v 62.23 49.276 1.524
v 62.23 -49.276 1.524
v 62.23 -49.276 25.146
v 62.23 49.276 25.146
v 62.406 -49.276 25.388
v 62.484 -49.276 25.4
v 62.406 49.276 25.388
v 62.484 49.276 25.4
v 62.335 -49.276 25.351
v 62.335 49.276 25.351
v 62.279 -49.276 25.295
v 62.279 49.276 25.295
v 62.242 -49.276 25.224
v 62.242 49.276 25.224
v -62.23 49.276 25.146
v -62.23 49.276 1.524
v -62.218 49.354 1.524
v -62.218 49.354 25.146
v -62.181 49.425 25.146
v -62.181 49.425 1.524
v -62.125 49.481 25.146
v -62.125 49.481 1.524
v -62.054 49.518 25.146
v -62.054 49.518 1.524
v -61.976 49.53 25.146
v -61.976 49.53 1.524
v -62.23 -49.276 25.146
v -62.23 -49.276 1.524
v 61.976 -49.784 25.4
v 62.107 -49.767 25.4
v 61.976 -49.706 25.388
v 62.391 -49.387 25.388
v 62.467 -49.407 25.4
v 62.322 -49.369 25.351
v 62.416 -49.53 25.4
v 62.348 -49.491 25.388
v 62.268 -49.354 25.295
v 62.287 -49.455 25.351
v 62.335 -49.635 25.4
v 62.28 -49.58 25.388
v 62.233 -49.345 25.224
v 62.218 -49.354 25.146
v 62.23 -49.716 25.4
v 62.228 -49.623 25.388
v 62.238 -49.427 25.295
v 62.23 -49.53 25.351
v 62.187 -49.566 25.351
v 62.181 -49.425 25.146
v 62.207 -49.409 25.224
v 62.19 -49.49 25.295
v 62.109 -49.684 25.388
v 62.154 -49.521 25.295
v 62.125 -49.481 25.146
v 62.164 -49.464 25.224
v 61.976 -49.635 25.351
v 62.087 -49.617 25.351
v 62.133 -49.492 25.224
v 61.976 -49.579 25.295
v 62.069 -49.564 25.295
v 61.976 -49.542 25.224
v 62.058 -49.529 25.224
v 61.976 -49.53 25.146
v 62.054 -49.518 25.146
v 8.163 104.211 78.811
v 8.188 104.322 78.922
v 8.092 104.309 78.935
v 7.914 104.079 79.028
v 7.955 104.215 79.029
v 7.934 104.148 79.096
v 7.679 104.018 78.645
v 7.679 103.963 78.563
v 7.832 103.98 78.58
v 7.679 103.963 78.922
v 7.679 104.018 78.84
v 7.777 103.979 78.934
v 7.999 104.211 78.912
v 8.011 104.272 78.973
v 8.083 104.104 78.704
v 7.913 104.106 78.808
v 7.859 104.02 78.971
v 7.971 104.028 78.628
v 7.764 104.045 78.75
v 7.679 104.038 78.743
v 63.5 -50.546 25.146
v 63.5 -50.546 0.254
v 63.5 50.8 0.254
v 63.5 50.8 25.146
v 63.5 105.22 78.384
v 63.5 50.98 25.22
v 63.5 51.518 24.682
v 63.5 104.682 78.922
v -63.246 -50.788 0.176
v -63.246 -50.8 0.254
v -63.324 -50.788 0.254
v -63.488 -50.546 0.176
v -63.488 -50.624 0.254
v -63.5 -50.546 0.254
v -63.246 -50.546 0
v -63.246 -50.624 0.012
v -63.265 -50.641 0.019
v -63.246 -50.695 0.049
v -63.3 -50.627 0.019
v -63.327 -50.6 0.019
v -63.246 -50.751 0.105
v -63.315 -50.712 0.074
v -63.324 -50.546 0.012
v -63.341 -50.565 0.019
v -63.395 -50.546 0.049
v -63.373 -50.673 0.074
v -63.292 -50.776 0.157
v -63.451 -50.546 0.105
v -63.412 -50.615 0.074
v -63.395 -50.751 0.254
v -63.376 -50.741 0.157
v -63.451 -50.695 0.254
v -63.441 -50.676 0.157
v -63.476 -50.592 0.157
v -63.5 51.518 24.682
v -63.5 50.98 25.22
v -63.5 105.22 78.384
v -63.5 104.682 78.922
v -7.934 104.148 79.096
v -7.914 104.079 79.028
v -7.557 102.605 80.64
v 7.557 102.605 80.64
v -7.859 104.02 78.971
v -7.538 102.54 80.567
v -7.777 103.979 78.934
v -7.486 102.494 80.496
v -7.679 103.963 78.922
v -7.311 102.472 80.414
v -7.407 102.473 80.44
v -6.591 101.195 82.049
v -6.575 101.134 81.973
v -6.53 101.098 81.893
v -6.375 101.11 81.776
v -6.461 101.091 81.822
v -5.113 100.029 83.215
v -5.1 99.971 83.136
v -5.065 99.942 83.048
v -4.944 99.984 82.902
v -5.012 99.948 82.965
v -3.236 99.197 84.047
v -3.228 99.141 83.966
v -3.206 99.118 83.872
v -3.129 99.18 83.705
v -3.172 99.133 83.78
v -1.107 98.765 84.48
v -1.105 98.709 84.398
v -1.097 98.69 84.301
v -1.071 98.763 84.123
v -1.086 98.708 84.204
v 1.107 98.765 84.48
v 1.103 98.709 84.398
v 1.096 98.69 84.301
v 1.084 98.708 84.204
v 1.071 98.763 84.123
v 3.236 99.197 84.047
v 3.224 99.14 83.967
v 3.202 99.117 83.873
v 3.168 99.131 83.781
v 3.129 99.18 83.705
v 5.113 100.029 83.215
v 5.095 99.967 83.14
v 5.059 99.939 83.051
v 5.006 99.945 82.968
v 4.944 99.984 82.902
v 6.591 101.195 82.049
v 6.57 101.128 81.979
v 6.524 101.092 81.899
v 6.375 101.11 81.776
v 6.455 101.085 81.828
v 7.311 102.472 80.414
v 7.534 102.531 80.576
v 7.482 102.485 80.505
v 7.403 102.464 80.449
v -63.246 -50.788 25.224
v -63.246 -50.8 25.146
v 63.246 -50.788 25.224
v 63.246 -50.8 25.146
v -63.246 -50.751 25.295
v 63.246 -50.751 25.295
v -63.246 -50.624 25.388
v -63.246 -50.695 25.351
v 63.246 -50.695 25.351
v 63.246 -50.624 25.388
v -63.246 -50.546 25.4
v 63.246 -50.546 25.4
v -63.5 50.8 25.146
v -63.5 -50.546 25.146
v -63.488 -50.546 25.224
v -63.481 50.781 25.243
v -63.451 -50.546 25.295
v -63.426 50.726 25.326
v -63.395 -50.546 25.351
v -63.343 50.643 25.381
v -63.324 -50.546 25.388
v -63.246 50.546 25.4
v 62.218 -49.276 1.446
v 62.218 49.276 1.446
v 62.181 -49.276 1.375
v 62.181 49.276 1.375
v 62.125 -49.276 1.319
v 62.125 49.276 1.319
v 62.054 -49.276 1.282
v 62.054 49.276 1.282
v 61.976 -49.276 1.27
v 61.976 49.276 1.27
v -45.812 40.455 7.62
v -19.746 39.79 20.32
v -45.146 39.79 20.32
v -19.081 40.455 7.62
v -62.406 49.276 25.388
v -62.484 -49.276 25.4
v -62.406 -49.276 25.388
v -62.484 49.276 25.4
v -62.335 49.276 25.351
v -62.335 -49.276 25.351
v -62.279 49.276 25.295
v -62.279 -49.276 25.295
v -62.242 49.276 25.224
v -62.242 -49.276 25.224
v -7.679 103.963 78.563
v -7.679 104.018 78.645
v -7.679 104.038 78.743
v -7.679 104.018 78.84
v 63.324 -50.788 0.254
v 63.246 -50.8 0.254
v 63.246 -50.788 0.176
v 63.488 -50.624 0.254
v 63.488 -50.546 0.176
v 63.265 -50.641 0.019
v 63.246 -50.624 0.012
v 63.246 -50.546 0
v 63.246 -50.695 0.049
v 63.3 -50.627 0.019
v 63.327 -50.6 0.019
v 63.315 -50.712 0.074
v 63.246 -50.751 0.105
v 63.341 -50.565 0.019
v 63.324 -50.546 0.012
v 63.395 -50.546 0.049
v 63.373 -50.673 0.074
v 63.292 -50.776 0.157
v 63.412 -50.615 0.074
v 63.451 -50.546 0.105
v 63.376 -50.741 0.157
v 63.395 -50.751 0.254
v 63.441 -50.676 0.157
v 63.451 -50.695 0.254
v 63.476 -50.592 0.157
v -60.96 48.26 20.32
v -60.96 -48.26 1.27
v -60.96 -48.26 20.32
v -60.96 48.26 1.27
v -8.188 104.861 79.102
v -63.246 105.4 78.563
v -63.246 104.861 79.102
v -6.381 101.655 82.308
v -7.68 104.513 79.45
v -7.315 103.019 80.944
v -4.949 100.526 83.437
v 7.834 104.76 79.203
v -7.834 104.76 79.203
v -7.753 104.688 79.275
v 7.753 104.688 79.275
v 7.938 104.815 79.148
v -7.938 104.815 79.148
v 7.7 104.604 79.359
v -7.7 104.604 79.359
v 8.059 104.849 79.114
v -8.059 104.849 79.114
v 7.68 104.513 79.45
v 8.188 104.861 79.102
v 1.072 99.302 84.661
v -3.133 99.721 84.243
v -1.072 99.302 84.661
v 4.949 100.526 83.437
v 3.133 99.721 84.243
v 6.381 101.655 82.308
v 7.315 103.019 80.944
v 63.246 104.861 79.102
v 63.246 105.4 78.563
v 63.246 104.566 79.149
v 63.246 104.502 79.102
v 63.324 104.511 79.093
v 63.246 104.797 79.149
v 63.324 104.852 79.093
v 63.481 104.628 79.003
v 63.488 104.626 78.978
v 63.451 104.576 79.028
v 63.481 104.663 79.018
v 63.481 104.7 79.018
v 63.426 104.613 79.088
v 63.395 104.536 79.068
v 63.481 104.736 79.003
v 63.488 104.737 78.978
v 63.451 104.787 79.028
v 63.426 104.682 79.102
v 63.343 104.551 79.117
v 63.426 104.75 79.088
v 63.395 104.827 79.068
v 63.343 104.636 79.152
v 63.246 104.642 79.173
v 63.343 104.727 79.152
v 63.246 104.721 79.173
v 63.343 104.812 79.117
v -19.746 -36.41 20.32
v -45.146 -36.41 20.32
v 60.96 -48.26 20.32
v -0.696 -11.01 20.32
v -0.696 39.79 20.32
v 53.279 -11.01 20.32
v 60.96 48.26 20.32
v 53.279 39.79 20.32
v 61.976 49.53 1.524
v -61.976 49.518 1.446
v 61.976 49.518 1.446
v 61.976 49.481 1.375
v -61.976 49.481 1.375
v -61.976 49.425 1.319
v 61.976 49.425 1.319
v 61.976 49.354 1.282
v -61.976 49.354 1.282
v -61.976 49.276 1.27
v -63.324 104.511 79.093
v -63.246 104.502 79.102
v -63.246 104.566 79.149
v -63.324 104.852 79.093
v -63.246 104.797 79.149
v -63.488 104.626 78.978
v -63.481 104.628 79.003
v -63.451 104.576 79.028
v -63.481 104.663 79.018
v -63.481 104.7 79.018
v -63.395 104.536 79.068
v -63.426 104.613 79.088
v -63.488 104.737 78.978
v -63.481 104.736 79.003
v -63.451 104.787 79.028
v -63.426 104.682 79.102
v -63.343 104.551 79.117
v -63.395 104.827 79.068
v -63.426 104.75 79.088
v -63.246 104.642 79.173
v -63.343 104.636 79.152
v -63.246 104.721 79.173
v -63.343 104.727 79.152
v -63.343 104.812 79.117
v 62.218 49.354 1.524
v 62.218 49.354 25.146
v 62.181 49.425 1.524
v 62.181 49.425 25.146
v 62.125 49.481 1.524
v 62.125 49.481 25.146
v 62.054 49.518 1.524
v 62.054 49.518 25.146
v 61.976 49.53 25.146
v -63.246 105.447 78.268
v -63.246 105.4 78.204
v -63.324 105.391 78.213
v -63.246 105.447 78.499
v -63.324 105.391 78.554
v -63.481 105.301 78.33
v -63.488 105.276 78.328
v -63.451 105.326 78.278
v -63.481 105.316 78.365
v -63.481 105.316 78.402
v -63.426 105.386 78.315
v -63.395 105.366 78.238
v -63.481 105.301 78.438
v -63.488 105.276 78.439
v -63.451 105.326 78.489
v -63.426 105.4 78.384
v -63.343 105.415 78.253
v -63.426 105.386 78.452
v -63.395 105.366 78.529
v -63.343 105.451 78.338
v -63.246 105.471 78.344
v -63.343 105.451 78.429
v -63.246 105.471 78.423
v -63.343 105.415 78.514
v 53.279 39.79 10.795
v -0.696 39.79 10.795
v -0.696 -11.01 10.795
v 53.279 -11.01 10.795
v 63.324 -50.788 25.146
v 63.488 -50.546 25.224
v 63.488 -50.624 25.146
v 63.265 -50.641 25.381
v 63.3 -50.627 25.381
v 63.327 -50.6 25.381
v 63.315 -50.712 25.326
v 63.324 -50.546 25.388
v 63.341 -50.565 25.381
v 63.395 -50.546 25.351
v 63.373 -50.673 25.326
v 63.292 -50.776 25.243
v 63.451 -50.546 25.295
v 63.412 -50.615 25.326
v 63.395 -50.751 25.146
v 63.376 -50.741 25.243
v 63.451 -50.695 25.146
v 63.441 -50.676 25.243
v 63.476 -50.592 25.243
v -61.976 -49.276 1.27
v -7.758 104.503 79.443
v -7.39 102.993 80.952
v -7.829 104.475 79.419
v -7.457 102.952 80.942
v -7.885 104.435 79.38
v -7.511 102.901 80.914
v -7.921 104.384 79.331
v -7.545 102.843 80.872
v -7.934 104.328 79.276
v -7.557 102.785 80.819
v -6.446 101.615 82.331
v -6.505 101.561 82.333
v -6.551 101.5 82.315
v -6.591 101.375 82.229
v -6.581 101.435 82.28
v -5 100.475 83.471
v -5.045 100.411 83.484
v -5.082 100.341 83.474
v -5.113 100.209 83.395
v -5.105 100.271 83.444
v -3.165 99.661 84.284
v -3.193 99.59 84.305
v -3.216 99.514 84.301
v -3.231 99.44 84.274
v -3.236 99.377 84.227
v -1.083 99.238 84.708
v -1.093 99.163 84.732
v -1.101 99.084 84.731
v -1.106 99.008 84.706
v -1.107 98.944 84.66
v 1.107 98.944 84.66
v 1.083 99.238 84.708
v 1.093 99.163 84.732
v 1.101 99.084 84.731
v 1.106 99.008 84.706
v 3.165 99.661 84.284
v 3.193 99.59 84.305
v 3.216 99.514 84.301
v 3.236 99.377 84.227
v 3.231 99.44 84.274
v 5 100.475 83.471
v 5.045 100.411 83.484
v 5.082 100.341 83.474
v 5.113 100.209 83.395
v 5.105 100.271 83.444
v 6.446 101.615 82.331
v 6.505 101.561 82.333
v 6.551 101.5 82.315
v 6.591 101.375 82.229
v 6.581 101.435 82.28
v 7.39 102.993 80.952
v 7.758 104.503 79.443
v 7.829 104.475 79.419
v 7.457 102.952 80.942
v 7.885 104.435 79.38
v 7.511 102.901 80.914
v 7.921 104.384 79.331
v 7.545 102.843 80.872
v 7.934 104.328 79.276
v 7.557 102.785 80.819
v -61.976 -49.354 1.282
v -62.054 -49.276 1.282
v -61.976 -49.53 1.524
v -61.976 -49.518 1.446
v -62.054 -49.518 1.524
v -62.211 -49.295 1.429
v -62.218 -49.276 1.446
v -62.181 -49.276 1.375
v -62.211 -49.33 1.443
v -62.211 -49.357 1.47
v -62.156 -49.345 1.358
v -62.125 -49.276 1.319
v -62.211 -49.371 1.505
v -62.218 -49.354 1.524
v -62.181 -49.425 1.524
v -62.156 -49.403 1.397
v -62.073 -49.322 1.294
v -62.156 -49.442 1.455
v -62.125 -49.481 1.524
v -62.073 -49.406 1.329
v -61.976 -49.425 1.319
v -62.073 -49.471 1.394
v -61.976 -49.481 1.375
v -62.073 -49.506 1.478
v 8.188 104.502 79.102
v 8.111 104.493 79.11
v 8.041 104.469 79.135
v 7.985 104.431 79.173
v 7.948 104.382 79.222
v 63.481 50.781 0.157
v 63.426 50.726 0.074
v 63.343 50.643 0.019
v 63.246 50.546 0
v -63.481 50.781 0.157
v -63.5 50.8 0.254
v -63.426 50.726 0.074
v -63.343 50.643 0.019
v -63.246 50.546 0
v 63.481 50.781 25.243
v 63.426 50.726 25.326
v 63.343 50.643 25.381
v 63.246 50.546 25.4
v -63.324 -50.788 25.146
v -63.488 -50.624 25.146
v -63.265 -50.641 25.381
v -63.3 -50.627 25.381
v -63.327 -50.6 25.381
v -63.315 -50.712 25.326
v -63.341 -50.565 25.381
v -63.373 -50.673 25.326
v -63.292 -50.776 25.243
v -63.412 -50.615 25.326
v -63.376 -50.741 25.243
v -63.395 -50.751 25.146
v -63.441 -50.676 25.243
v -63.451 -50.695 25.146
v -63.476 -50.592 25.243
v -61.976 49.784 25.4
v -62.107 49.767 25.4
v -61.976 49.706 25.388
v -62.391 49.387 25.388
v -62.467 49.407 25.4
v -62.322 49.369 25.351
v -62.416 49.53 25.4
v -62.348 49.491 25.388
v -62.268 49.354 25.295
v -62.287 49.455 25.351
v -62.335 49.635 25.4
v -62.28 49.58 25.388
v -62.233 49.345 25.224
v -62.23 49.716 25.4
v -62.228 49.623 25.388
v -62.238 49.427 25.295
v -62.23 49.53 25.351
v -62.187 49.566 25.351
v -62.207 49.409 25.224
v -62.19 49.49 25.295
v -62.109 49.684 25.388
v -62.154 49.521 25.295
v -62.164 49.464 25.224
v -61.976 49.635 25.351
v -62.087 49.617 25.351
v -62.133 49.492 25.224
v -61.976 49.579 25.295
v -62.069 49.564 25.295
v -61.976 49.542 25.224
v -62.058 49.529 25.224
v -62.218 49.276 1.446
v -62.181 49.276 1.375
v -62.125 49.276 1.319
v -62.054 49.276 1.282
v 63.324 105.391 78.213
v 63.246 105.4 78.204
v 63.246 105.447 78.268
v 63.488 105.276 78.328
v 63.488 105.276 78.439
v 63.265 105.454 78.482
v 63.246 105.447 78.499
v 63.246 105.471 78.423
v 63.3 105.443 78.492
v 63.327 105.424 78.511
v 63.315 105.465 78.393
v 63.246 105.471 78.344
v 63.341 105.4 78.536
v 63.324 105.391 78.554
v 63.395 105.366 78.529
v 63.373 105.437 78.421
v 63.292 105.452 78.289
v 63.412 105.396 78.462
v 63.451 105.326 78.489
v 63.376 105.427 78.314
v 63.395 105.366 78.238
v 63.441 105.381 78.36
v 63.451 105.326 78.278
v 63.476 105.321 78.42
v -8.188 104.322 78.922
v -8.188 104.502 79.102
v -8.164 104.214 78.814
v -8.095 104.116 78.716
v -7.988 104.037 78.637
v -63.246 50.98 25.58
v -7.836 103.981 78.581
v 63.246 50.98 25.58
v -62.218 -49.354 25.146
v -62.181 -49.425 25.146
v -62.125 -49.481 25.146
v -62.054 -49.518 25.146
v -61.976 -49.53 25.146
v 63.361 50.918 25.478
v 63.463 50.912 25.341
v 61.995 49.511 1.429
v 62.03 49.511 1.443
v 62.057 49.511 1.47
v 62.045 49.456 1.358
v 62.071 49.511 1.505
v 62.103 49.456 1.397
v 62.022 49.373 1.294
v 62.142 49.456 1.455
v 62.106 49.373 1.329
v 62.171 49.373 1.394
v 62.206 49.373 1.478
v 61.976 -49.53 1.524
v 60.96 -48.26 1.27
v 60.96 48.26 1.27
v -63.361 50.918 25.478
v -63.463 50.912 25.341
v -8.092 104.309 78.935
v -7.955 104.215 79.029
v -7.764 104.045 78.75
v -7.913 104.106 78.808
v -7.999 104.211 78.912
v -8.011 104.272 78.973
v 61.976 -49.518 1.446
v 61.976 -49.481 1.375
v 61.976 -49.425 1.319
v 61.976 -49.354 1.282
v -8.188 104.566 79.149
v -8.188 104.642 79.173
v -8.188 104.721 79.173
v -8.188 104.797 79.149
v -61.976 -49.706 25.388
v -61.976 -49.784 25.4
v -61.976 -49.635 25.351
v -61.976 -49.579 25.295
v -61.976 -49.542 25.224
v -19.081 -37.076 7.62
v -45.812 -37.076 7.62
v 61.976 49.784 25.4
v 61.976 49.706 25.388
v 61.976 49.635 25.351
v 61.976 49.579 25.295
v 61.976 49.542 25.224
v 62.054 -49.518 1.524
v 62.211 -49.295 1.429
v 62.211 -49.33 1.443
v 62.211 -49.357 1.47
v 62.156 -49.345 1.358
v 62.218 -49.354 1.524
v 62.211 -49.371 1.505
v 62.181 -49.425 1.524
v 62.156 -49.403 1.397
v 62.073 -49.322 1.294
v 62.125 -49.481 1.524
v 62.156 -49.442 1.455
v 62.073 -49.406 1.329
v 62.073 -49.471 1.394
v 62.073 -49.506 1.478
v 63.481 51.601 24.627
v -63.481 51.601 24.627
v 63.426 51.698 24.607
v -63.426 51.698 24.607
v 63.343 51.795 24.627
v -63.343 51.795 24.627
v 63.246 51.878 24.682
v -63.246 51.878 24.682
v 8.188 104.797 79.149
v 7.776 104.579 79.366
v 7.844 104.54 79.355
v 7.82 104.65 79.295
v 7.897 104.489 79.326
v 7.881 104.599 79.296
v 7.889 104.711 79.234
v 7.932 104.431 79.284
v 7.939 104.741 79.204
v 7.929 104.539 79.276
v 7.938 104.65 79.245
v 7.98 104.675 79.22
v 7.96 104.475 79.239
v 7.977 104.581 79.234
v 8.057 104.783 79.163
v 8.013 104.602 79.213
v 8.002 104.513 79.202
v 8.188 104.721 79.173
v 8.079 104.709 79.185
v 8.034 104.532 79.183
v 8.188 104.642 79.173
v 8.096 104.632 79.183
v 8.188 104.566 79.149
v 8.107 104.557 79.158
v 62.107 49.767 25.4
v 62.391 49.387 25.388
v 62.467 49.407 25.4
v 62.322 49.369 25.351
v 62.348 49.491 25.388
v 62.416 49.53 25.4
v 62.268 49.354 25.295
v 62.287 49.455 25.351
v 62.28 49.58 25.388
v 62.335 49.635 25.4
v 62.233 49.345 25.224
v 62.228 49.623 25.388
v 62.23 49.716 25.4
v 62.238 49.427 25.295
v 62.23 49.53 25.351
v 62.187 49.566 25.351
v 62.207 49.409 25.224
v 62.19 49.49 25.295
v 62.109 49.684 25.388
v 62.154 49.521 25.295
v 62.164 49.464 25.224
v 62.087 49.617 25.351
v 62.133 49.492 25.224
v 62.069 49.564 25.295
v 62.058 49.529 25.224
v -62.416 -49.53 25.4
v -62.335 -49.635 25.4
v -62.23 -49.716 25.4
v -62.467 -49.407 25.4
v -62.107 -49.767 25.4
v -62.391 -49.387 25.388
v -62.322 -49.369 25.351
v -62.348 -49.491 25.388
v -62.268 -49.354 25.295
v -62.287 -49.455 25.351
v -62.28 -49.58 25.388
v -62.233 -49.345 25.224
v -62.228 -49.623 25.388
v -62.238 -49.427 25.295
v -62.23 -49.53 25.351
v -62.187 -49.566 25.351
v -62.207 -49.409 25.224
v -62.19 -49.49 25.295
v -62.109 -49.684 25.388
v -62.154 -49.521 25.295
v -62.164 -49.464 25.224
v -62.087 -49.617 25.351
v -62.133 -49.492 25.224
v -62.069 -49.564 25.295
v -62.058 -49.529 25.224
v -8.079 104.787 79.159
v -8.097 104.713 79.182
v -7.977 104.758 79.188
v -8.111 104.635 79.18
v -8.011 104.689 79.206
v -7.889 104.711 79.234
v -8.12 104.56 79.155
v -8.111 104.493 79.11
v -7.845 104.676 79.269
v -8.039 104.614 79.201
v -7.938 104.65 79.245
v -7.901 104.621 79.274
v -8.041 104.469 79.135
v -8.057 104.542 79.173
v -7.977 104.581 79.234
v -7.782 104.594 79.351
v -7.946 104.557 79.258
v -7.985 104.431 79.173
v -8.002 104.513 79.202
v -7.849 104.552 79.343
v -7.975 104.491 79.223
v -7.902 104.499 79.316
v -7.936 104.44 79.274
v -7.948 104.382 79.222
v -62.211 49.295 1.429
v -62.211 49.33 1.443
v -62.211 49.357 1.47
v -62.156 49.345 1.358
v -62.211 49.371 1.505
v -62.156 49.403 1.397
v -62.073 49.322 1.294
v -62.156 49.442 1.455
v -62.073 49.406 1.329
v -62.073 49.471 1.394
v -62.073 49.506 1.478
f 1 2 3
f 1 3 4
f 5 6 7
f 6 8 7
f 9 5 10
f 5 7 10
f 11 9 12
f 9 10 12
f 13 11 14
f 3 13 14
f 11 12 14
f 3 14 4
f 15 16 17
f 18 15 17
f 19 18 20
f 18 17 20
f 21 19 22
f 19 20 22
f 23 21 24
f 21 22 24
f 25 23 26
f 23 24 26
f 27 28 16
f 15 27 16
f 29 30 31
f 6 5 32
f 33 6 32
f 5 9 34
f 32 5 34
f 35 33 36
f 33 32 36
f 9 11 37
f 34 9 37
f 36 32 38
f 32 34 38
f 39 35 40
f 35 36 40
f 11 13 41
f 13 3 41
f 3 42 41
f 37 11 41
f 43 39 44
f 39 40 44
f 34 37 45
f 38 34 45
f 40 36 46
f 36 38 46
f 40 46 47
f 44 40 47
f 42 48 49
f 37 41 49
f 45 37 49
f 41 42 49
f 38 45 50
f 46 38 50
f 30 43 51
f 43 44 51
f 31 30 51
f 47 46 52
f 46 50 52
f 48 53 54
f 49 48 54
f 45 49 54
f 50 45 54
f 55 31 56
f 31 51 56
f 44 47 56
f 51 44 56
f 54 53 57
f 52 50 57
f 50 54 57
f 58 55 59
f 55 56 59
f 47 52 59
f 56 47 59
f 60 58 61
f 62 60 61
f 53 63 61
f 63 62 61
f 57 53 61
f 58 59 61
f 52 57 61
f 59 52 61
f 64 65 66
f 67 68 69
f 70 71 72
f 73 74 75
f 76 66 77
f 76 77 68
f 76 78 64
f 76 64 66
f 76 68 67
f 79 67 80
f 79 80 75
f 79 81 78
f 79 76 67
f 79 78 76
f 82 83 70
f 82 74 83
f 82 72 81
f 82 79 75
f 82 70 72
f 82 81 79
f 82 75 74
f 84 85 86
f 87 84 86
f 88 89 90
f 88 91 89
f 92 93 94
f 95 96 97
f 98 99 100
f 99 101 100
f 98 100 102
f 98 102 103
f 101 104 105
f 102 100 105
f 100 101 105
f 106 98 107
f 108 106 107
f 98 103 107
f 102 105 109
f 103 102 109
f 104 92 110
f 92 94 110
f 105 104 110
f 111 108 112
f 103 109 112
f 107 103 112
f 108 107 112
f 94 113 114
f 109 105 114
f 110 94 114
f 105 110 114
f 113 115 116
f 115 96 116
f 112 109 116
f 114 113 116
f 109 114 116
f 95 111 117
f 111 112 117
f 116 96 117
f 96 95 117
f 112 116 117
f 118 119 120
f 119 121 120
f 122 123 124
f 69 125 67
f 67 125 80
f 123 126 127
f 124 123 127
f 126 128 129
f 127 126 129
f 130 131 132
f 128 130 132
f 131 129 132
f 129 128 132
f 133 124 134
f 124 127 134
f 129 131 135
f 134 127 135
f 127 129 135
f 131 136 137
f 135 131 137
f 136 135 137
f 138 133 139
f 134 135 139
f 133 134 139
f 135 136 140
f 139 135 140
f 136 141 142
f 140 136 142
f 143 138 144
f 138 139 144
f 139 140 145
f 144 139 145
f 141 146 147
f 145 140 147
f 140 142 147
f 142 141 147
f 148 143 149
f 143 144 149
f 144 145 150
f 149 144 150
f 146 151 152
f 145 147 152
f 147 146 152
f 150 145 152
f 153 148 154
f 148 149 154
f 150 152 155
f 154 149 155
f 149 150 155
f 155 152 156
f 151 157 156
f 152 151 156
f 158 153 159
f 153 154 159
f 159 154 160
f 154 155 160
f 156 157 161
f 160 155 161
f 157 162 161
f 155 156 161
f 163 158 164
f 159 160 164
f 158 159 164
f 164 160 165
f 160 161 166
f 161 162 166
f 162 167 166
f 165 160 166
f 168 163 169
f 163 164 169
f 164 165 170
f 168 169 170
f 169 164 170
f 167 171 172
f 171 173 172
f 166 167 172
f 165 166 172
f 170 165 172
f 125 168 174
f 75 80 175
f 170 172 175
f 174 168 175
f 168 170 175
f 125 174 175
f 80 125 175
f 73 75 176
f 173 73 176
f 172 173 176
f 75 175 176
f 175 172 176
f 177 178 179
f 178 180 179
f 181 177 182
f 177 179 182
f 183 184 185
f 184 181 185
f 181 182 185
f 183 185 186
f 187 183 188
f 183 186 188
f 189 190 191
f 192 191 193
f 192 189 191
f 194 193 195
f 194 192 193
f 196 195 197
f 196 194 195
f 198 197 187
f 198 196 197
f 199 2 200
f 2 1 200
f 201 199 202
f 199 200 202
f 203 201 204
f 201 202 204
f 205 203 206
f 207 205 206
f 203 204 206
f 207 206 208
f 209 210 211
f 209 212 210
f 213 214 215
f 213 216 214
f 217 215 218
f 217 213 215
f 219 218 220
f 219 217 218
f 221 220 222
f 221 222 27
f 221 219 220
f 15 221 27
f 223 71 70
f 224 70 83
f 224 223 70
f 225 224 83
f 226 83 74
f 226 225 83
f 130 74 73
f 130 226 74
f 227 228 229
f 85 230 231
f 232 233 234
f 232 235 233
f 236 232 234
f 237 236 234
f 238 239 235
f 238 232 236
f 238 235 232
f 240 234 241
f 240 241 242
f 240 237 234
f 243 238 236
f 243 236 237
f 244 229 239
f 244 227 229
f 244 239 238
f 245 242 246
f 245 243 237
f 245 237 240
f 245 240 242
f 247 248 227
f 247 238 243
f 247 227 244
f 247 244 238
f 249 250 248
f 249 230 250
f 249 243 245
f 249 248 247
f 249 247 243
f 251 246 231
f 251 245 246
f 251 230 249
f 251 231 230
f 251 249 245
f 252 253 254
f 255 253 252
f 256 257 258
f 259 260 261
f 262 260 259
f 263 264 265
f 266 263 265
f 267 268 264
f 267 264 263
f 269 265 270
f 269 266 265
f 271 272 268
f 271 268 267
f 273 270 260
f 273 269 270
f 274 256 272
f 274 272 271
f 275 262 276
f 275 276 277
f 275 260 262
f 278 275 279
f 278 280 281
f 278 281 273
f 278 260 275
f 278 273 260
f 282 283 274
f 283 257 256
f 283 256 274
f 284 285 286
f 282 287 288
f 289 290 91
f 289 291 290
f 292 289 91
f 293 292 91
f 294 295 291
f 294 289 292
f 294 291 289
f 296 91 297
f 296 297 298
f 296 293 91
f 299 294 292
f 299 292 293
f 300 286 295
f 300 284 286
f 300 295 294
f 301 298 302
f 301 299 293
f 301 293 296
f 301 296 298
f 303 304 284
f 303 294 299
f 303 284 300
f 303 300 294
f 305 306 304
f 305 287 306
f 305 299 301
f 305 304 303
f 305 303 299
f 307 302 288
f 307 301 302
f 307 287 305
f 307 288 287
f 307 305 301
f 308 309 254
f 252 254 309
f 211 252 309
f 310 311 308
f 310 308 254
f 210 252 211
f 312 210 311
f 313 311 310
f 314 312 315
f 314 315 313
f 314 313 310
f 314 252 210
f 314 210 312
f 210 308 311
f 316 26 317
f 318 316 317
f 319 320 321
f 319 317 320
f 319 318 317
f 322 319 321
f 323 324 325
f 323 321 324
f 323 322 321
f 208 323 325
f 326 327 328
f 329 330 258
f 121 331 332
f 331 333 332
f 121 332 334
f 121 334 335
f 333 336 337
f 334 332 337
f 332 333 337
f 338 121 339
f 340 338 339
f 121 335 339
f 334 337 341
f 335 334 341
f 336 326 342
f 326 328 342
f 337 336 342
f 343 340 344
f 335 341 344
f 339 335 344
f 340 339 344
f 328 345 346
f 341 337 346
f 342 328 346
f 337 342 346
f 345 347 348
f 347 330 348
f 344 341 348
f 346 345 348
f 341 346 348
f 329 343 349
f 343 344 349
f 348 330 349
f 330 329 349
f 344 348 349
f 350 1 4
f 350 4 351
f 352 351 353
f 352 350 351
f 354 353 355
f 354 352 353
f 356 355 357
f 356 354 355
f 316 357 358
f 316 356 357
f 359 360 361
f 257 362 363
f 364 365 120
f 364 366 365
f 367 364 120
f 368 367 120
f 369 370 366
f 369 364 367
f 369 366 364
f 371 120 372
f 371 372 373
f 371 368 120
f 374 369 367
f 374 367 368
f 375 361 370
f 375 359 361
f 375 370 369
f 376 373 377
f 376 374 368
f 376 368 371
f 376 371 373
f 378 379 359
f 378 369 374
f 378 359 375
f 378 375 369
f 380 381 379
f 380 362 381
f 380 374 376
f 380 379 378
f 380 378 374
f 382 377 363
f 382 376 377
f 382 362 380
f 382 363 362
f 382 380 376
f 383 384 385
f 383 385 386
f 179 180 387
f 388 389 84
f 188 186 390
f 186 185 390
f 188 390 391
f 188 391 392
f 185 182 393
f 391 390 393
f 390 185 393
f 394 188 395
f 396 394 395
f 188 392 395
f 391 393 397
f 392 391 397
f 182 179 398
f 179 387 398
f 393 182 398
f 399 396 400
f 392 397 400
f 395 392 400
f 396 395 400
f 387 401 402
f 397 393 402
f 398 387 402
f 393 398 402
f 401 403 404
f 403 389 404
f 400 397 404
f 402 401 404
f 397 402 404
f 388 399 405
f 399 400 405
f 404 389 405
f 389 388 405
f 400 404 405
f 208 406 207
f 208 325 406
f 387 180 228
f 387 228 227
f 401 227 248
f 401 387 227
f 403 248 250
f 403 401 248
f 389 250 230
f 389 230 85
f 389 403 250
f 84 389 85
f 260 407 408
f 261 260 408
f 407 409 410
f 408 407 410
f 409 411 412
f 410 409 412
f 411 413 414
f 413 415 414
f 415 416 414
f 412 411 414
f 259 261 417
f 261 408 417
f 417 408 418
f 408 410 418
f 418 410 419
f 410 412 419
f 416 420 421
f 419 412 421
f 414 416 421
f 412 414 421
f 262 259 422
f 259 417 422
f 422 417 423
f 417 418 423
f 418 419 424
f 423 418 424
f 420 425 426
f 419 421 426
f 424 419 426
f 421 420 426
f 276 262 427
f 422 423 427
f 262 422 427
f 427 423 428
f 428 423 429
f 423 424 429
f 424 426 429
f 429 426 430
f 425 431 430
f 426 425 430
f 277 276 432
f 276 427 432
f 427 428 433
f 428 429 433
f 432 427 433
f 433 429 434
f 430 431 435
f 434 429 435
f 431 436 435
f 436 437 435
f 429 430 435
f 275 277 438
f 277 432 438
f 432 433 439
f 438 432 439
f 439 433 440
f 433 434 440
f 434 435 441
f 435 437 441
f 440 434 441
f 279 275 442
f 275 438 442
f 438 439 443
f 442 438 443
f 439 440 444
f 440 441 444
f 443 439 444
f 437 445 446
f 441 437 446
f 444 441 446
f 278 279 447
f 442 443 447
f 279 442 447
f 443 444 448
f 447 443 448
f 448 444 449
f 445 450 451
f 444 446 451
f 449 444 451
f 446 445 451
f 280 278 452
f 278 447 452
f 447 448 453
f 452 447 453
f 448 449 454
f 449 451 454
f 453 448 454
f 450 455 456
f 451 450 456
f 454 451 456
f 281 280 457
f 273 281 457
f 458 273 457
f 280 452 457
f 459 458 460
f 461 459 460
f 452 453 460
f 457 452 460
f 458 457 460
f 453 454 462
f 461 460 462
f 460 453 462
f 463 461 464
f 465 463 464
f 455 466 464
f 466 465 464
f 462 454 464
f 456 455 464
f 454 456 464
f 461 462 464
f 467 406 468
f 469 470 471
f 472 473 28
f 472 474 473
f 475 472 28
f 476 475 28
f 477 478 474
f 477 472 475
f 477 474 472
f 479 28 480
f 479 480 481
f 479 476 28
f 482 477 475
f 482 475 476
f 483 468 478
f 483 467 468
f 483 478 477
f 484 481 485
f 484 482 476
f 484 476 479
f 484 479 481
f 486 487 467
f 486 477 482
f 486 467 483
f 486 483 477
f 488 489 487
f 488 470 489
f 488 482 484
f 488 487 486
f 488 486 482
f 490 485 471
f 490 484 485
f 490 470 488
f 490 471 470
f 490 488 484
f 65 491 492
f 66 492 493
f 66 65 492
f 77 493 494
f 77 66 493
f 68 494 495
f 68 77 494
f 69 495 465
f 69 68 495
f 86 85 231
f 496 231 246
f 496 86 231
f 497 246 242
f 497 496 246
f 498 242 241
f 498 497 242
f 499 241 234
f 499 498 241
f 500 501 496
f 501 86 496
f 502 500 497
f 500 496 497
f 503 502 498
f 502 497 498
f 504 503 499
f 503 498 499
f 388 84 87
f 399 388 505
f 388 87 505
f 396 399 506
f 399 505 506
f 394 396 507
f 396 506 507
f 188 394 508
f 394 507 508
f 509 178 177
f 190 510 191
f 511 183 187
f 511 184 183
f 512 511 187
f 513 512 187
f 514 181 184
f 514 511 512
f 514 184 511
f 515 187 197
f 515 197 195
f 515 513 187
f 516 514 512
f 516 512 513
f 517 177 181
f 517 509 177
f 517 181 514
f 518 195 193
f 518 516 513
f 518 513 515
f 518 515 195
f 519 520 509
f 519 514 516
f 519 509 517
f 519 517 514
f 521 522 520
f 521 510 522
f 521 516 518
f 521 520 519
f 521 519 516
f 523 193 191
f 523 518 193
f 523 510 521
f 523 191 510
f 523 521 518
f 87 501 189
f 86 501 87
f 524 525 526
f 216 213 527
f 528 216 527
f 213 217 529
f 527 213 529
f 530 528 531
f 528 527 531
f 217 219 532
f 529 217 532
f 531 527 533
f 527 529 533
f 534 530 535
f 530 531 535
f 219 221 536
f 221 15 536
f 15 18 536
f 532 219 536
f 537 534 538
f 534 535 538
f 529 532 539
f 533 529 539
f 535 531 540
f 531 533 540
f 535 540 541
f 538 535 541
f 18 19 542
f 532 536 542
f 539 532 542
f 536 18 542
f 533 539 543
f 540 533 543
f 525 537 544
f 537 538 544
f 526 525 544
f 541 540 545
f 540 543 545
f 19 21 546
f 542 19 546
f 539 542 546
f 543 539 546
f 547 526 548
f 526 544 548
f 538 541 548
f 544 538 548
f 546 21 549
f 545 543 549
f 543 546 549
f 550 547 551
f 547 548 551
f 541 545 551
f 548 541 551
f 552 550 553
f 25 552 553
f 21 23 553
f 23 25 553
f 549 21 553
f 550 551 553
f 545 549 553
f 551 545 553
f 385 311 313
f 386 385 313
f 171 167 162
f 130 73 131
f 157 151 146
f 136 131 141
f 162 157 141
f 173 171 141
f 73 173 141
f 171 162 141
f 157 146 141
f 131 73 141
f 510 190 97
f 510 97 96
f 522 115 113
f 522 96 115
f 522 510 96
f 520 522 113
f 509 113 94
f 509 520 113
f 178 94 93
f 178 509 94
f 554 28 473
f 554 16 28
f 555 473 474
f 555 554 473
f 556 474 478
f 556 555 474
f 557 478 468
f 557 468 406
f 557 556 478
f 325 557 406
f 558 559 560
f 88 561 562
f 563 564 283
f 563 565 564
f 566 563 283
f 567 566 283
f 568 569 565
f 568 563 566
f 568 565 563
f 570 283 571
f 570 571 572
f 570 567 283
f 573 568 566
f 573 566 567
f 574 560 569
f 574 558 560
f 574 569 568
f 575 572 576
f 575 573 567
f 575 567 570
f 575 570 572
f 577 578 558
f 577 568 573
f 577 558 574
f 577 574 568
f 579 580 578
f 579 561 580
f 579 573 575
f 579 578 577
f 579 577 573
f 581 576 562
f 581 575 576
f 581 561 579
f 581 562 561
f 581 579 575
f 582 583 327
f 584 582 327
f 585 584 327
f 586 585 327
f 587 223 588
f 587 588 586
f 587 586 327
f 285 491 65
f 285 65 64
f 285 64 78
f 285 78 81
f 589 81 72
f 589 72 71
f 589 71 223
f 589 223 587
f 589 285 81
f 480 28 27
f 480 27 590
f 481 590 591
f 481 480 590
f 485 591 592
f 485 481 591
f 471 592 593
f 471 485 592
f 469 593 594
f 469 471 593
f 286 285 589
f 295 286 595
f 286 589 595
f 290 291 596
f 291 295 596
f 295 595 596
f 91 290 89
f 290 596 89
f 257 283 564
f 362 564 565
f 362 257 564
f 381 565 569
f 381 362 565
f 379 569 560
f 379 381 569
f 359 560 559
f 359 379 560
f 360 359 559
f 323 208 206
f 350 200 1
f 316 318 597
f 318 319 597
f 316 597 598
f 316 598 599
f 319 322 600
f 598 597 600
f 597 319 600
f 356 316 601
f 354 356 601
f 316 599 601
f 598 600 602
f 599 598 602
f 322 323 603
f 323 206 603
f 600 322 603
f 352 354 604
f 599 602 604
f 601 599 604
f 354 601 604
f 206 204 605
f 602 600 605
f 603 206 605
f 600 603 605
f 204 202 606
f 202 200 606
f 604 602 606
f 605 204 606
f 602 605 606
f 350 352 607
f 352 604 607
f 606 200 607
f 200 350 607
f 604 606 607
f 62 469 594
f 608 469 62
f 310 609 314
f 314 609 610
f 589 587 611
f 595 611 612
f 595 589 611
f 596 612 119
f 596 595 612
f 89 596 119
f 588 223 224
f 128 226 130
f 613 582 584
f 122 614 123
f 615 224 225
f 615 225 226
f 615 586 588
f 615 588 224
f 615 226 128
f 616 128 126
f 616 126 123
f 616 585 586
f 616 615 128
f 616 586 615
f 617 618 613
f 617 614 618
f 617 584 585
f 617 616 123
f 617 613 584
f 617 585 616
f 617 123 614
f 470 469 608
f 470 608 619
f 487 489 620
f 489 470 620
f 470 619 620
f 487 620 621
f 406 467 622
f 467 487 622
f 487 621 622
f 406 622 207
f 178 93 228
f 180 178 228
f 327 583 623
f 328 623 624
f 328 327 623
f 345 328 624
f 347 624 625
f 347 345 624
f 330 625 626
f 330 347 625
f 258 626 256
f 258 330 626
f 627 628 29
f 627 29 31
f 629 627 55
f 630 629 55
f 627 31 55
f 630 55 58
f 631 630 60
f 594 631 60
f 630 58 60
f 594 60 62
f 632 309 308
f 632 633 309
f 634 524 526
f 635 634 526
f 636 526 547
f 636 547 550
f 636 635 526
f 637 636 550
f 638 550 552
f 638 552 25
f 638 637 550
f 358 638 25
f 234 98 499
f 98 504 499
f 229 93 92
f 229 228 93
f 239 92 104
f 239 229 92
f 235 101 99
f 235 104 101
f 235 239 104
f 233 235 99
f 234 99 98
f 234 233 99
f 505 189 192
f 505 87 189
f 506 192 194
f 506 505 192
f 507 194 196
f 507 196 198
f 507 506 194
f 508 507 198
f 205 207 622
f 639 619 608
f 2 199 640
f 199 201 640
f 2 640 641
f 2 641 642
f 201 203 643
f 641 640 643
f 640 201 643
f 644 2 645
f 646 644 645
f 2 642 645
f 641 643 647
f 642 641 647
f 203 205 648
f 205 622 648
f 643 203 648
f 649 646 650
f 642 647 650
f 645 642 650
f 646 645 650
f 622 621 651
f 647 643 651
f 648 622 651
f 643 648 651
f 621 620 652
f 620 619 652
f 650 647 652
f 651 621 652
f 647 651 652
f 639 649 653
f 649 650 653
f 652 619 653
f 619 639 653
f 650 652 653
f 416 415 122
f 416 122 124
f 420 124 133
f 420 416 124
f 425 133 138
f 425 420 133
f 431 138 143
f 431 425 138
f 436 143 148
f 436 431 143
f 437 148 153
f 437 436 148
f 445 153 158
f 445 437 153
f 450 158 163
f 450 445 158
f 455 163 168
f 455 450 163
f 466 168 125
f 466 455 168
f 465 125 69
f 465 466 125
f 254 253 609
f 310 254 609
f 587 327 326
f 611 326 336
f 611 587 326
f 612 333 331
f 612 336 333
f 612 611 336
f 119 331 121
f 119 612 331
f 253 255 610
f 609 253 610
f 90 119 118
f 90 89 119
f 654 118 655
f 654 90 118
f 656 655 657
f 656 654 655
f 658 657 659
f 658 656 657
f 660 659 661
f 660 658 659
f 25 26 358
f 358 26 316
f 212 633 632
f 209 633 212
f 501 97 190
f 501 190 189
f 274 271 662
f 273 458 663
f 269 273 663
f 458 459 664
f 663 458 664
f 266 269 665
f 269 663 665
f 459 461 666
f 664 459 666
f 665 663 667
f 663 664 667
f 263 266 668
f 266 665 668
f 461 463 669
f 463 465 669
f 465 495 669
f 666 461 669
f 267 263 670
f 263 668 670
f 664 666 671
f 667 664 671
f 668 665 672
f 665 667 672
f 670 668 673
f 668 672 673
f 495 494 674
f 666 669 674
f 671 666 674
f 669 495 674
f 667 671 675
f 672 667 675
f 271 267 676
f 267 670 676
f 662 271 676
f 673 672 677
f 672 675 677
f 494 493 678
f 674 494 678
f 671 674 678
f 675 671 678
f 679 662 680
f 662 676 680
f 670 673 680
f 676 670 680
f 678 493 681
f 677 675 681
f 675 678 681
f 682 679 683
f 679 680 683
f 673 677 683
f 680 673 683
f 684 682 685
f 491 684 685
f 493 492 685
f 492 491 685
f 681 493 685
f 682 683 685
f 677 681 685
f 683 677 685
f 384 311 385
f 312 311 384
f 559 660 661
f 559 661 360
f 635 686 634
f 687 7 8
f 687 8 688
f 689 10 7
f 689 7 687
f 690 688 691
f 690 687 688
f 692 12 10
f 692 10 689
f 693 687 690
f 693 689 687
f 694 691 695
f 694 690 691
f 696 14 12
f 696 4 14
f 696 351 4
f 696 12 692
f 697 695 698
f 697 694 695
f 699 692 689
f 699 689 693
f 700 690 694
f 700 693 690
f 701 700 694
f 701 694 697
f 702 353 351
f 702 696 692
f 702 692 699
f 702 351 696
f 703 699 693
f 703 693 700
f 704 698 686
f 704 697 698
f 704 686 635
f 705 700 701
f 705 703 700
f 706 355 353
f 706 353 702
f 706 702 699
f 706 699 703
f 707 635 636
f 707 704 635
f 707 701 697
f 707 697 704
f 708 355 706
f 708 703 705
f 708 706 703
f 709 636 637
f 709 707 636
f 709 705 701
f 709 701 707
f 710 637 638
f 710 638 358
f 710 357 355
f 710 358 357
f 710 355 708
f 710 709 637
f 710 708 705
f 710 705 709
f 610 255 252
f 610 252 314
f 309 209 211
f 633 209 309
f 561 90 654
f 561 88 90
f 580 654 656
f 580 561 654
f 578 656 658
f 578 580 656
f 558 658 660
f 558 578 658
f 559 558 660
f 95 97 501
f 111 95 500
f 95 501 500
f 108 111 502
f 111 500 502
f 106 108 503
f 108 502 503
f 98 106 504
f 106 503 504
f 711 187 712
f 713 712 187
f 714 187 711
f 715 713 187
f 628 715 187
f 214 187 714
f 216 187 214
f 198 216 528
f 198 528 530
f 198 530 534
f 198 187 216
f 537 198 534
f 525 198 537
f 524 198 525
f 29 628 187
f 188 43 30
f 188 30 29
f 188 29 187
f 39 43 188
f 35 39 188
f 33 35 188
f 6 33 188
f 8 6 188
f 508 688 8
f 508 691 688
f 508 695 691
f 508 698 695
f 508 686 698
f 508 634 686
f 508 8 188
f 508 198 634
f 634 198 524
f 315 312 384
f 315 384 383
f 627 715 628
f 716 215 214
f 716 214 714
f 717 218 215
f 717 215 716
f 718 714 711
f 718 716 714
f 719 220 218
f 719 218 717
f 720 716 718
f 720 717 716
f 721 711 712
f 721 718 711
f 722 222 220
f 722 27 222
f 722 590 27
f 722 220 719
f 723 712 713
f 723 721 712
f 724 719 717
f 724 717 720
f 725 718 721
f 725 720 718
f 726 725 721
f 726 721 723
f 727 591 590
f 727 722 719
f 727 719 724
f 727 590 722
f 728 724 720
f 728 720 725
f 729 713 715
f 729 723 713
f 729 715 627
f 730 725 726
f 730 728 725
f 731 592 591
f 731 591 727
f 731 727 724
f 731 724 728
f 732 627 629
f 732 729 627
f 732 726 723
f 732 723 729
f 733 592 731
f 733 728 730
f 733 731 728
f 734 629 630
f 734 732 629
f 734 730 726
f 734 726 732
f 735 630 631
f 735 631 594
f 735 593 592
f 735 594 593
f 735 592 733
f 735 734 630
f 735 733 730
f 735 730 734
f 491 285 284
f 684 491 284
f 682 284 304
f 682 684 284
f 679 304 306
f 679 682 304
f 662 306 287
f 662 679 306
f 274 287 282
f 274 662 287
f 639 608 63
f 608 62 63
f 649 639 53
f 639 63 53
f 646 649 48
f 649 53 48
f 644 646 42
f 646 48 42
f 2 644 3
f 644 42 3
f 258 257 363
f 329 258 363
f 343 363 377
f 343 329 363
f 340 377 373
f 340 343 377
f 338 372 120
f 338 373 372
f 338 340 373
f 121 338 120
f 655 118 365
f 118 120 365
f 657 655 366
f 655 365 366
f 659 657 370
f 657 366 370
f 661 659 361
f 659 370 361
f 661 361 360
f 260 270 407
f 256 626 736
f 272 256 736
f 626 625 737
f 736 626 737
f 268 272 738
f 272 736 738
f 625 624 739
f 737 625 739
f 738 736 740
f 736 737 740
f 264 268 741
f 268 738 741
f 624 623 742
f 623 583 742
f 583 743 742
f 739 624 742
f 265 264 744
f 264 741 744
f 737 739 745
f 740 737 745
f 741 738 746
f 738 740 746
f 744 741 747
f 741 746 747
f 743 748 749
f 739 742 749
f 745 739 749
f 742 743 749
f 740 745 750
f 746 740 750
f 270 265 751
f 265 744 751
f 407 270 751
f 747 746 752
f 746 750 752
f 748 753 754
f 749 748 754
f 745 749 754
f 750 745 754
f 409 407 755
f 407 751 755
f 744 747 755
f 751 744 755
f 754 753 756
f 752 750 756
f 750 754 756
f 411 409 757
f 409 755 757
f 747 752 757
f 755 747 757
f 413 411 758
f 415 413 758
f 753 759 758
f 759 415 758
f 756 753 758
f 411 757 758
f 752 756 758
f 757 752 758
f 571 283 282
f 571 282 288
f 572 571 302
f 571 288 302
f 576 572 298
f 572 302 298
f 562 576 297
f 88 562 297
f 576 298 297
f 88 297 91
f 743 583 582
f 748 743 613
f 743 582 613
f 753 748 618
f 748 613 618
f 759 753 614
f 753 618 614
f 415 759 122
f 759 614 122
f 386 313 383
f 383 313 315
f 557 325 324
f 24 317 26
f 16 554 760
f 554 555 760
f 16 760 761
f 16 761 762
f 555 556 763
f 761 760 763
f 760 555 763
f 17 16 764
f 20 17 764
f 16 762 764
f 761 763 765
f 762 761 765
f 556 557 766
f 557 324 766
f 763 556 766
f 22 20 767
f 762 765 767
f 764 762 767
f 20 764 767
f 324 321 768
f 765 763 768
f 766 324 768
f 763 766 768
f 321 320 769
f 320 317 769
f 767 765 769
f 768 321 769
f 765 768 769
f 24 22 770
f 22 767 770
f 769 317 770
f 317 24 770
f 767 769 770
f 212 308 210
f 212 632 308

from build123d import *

# Parameters (mm, degrees)
F0_W          = 127
F0_H          = 101.6
F1_DEPTH      = 25.4
F2_T          = -1.27
F4_DEPTH      = 63.5
F4_DEPTH_BACK = 63.5
F5_R          = 0.254
F7_DEPTH      = 0.762
F8_R          = 0.254
F10_W         = 121.92
F10_H         = 96.52
F11_DEPTH     = 19.05
F12_W         = 53.975
F12_H         = 50.8
F13_DEPTH     = 9.525
F14_W         = 25.4
F14_H         = 76.2
F15_DEPTH     = 12.7
F15_TAPER     = -3


with BuildPart() as f1:
    # F0 (on Top) → F1 (new body)
    with BuildSketch(Plane.XY):
        Rectangle(F0_W, F0_H)
    extrude(amount=F1_DEPTH)

    # F2
    f2_openings = [f1.faces().sort_by_distance(p)[0] for p in [
        (0, 0, 25.4),
    ]]
    offset(amount=F2_T, openings=f2_openings)

    # F5
    f5_edges = [f1.edges().sort_by_distance(p)[0] for p in [
        (63.5, -50.8, 12.7),
        (-63.5, -50.8, 12.7),
        (0, -50.8, 0),
        (63.5, 0, 0),
        (0, 50.8, 0),
        (-63.5, 0, 0),
        (0, -49.53, 1.27),
        (62.23, 0, 1.27),
        (0, 49.53, 1.27),
        (-62.23, 0, 1.27),
        (0, -49.53, 25.4),
        (62.23, -49.53, 13.335),
        (-62.23, -49.53, 13.335),
        (0, 49.53, 25.4),
        (-62.23, 49.53, 13.335),
        (62.23, 49.53, 13.335),
        (0, -50.8, 25.4),
        (63.5, 0, 25.4),
        (0, 50.8, 25.4),
        (-63.5, 0, 25.4),
        (-62.23, 0, 25.4),
        (62.23, 0, 25.4),
    ]]
    fillet(f5_edges, radius=F5_R)


with BuildPart() as f4:
    # F3 (on Right) → F4 (new body, two sides)
    with BuildSketch(Plane.YZ) as f4_sk:
        Polygon((104.6815367264, 79.2815367264), (50.8, 25.4), (51.6980256121, 24.5019743879), (105.5795623385, 78.3835111143), align=None)
    extrude(amount=F4_DEPTH)
    extrude(f4_sk.sketch, amount=-F4_DEPTH_BACK)

    # F6 (on face) → F7 (join)
    with BuildSketch(Plane(origin=(0, 91.9815367264, 91.9815367264), x_dir=(-1, 0, 0), z_dir=(0, 0.7071067812, 0.7071067812))):
        with BuildLine():
            Line((-7.9375, -17.9605122421), (7.9375, -17.9605122421))
            ThreePointArc((7.9375, -17.9605122421), (0, -10.0230122421), (-7.9375, -17.9605122421))
        make_face()
    extrude(amount=-F7_DEPTH)

    # F8
    f8_edges = [f4.edges().sort_by_distance(p)[0] for p in [
        (0, 51.698026, 24.501974),
        (63.5, 78.638794, 51.442743),
        (0, 105.579562, 78.383511),
        (-63.5, 78.638794, 51.442743),
        (35.71875, 104.681537, 79.281537),
        (7.9375, 104.412129, 79.012129),
        (0, 104.142721, 78.742721),
        (-7.9375, 104.412129, 79.012129),
        (-35.71875, 104.681537, 79.281537),
        (-63.5, 77.740768, 52.340768),
        (0, 50.8, 25.4),
        (63.5, 77.740768, 52.340768),
        (63.5, 105.13055, 78.832524),
        (0, 99.068877, 84.894197),
        (-63.5, 105.13055, 78.832524),
        (0, 98.530061, 84.355381),
    ]]
    fillet(f8_edges, radius=F8_R)


with BuildPart() as f11:
    # F10 (on face) → F11 (new body)
    with BuildSketch(Plane.XY.offset(1.27)):
        Rectangle(F10_W, F10_H)
    extrude(amount=F11_DEPTH)

    # F12 (on face) → F13 (cut)
    with BuildSketch(Plane.XY.offset(20.32)):
        with Locations((26.2910816818, 14.3898101524)):
            Rectangle(F12_W, F12_H)
    extrude(amount=-F13_DEPTH, mode=Mode.SUBTRACT)

    # F14 (on face) → F15 (cut)
    with BuildSketch(Plane.XY.offset(20.32)):
        with Locations((-32.4464183182, 1.6898101524)):
            Rectangle(F14_W, F14_H)
    extrude(amount=-F15_DEPTH, taper=F15_TAPER, mode=Mode.SUBTRACT)


solid = Compound([f1.part, f4.part, f11.part])
